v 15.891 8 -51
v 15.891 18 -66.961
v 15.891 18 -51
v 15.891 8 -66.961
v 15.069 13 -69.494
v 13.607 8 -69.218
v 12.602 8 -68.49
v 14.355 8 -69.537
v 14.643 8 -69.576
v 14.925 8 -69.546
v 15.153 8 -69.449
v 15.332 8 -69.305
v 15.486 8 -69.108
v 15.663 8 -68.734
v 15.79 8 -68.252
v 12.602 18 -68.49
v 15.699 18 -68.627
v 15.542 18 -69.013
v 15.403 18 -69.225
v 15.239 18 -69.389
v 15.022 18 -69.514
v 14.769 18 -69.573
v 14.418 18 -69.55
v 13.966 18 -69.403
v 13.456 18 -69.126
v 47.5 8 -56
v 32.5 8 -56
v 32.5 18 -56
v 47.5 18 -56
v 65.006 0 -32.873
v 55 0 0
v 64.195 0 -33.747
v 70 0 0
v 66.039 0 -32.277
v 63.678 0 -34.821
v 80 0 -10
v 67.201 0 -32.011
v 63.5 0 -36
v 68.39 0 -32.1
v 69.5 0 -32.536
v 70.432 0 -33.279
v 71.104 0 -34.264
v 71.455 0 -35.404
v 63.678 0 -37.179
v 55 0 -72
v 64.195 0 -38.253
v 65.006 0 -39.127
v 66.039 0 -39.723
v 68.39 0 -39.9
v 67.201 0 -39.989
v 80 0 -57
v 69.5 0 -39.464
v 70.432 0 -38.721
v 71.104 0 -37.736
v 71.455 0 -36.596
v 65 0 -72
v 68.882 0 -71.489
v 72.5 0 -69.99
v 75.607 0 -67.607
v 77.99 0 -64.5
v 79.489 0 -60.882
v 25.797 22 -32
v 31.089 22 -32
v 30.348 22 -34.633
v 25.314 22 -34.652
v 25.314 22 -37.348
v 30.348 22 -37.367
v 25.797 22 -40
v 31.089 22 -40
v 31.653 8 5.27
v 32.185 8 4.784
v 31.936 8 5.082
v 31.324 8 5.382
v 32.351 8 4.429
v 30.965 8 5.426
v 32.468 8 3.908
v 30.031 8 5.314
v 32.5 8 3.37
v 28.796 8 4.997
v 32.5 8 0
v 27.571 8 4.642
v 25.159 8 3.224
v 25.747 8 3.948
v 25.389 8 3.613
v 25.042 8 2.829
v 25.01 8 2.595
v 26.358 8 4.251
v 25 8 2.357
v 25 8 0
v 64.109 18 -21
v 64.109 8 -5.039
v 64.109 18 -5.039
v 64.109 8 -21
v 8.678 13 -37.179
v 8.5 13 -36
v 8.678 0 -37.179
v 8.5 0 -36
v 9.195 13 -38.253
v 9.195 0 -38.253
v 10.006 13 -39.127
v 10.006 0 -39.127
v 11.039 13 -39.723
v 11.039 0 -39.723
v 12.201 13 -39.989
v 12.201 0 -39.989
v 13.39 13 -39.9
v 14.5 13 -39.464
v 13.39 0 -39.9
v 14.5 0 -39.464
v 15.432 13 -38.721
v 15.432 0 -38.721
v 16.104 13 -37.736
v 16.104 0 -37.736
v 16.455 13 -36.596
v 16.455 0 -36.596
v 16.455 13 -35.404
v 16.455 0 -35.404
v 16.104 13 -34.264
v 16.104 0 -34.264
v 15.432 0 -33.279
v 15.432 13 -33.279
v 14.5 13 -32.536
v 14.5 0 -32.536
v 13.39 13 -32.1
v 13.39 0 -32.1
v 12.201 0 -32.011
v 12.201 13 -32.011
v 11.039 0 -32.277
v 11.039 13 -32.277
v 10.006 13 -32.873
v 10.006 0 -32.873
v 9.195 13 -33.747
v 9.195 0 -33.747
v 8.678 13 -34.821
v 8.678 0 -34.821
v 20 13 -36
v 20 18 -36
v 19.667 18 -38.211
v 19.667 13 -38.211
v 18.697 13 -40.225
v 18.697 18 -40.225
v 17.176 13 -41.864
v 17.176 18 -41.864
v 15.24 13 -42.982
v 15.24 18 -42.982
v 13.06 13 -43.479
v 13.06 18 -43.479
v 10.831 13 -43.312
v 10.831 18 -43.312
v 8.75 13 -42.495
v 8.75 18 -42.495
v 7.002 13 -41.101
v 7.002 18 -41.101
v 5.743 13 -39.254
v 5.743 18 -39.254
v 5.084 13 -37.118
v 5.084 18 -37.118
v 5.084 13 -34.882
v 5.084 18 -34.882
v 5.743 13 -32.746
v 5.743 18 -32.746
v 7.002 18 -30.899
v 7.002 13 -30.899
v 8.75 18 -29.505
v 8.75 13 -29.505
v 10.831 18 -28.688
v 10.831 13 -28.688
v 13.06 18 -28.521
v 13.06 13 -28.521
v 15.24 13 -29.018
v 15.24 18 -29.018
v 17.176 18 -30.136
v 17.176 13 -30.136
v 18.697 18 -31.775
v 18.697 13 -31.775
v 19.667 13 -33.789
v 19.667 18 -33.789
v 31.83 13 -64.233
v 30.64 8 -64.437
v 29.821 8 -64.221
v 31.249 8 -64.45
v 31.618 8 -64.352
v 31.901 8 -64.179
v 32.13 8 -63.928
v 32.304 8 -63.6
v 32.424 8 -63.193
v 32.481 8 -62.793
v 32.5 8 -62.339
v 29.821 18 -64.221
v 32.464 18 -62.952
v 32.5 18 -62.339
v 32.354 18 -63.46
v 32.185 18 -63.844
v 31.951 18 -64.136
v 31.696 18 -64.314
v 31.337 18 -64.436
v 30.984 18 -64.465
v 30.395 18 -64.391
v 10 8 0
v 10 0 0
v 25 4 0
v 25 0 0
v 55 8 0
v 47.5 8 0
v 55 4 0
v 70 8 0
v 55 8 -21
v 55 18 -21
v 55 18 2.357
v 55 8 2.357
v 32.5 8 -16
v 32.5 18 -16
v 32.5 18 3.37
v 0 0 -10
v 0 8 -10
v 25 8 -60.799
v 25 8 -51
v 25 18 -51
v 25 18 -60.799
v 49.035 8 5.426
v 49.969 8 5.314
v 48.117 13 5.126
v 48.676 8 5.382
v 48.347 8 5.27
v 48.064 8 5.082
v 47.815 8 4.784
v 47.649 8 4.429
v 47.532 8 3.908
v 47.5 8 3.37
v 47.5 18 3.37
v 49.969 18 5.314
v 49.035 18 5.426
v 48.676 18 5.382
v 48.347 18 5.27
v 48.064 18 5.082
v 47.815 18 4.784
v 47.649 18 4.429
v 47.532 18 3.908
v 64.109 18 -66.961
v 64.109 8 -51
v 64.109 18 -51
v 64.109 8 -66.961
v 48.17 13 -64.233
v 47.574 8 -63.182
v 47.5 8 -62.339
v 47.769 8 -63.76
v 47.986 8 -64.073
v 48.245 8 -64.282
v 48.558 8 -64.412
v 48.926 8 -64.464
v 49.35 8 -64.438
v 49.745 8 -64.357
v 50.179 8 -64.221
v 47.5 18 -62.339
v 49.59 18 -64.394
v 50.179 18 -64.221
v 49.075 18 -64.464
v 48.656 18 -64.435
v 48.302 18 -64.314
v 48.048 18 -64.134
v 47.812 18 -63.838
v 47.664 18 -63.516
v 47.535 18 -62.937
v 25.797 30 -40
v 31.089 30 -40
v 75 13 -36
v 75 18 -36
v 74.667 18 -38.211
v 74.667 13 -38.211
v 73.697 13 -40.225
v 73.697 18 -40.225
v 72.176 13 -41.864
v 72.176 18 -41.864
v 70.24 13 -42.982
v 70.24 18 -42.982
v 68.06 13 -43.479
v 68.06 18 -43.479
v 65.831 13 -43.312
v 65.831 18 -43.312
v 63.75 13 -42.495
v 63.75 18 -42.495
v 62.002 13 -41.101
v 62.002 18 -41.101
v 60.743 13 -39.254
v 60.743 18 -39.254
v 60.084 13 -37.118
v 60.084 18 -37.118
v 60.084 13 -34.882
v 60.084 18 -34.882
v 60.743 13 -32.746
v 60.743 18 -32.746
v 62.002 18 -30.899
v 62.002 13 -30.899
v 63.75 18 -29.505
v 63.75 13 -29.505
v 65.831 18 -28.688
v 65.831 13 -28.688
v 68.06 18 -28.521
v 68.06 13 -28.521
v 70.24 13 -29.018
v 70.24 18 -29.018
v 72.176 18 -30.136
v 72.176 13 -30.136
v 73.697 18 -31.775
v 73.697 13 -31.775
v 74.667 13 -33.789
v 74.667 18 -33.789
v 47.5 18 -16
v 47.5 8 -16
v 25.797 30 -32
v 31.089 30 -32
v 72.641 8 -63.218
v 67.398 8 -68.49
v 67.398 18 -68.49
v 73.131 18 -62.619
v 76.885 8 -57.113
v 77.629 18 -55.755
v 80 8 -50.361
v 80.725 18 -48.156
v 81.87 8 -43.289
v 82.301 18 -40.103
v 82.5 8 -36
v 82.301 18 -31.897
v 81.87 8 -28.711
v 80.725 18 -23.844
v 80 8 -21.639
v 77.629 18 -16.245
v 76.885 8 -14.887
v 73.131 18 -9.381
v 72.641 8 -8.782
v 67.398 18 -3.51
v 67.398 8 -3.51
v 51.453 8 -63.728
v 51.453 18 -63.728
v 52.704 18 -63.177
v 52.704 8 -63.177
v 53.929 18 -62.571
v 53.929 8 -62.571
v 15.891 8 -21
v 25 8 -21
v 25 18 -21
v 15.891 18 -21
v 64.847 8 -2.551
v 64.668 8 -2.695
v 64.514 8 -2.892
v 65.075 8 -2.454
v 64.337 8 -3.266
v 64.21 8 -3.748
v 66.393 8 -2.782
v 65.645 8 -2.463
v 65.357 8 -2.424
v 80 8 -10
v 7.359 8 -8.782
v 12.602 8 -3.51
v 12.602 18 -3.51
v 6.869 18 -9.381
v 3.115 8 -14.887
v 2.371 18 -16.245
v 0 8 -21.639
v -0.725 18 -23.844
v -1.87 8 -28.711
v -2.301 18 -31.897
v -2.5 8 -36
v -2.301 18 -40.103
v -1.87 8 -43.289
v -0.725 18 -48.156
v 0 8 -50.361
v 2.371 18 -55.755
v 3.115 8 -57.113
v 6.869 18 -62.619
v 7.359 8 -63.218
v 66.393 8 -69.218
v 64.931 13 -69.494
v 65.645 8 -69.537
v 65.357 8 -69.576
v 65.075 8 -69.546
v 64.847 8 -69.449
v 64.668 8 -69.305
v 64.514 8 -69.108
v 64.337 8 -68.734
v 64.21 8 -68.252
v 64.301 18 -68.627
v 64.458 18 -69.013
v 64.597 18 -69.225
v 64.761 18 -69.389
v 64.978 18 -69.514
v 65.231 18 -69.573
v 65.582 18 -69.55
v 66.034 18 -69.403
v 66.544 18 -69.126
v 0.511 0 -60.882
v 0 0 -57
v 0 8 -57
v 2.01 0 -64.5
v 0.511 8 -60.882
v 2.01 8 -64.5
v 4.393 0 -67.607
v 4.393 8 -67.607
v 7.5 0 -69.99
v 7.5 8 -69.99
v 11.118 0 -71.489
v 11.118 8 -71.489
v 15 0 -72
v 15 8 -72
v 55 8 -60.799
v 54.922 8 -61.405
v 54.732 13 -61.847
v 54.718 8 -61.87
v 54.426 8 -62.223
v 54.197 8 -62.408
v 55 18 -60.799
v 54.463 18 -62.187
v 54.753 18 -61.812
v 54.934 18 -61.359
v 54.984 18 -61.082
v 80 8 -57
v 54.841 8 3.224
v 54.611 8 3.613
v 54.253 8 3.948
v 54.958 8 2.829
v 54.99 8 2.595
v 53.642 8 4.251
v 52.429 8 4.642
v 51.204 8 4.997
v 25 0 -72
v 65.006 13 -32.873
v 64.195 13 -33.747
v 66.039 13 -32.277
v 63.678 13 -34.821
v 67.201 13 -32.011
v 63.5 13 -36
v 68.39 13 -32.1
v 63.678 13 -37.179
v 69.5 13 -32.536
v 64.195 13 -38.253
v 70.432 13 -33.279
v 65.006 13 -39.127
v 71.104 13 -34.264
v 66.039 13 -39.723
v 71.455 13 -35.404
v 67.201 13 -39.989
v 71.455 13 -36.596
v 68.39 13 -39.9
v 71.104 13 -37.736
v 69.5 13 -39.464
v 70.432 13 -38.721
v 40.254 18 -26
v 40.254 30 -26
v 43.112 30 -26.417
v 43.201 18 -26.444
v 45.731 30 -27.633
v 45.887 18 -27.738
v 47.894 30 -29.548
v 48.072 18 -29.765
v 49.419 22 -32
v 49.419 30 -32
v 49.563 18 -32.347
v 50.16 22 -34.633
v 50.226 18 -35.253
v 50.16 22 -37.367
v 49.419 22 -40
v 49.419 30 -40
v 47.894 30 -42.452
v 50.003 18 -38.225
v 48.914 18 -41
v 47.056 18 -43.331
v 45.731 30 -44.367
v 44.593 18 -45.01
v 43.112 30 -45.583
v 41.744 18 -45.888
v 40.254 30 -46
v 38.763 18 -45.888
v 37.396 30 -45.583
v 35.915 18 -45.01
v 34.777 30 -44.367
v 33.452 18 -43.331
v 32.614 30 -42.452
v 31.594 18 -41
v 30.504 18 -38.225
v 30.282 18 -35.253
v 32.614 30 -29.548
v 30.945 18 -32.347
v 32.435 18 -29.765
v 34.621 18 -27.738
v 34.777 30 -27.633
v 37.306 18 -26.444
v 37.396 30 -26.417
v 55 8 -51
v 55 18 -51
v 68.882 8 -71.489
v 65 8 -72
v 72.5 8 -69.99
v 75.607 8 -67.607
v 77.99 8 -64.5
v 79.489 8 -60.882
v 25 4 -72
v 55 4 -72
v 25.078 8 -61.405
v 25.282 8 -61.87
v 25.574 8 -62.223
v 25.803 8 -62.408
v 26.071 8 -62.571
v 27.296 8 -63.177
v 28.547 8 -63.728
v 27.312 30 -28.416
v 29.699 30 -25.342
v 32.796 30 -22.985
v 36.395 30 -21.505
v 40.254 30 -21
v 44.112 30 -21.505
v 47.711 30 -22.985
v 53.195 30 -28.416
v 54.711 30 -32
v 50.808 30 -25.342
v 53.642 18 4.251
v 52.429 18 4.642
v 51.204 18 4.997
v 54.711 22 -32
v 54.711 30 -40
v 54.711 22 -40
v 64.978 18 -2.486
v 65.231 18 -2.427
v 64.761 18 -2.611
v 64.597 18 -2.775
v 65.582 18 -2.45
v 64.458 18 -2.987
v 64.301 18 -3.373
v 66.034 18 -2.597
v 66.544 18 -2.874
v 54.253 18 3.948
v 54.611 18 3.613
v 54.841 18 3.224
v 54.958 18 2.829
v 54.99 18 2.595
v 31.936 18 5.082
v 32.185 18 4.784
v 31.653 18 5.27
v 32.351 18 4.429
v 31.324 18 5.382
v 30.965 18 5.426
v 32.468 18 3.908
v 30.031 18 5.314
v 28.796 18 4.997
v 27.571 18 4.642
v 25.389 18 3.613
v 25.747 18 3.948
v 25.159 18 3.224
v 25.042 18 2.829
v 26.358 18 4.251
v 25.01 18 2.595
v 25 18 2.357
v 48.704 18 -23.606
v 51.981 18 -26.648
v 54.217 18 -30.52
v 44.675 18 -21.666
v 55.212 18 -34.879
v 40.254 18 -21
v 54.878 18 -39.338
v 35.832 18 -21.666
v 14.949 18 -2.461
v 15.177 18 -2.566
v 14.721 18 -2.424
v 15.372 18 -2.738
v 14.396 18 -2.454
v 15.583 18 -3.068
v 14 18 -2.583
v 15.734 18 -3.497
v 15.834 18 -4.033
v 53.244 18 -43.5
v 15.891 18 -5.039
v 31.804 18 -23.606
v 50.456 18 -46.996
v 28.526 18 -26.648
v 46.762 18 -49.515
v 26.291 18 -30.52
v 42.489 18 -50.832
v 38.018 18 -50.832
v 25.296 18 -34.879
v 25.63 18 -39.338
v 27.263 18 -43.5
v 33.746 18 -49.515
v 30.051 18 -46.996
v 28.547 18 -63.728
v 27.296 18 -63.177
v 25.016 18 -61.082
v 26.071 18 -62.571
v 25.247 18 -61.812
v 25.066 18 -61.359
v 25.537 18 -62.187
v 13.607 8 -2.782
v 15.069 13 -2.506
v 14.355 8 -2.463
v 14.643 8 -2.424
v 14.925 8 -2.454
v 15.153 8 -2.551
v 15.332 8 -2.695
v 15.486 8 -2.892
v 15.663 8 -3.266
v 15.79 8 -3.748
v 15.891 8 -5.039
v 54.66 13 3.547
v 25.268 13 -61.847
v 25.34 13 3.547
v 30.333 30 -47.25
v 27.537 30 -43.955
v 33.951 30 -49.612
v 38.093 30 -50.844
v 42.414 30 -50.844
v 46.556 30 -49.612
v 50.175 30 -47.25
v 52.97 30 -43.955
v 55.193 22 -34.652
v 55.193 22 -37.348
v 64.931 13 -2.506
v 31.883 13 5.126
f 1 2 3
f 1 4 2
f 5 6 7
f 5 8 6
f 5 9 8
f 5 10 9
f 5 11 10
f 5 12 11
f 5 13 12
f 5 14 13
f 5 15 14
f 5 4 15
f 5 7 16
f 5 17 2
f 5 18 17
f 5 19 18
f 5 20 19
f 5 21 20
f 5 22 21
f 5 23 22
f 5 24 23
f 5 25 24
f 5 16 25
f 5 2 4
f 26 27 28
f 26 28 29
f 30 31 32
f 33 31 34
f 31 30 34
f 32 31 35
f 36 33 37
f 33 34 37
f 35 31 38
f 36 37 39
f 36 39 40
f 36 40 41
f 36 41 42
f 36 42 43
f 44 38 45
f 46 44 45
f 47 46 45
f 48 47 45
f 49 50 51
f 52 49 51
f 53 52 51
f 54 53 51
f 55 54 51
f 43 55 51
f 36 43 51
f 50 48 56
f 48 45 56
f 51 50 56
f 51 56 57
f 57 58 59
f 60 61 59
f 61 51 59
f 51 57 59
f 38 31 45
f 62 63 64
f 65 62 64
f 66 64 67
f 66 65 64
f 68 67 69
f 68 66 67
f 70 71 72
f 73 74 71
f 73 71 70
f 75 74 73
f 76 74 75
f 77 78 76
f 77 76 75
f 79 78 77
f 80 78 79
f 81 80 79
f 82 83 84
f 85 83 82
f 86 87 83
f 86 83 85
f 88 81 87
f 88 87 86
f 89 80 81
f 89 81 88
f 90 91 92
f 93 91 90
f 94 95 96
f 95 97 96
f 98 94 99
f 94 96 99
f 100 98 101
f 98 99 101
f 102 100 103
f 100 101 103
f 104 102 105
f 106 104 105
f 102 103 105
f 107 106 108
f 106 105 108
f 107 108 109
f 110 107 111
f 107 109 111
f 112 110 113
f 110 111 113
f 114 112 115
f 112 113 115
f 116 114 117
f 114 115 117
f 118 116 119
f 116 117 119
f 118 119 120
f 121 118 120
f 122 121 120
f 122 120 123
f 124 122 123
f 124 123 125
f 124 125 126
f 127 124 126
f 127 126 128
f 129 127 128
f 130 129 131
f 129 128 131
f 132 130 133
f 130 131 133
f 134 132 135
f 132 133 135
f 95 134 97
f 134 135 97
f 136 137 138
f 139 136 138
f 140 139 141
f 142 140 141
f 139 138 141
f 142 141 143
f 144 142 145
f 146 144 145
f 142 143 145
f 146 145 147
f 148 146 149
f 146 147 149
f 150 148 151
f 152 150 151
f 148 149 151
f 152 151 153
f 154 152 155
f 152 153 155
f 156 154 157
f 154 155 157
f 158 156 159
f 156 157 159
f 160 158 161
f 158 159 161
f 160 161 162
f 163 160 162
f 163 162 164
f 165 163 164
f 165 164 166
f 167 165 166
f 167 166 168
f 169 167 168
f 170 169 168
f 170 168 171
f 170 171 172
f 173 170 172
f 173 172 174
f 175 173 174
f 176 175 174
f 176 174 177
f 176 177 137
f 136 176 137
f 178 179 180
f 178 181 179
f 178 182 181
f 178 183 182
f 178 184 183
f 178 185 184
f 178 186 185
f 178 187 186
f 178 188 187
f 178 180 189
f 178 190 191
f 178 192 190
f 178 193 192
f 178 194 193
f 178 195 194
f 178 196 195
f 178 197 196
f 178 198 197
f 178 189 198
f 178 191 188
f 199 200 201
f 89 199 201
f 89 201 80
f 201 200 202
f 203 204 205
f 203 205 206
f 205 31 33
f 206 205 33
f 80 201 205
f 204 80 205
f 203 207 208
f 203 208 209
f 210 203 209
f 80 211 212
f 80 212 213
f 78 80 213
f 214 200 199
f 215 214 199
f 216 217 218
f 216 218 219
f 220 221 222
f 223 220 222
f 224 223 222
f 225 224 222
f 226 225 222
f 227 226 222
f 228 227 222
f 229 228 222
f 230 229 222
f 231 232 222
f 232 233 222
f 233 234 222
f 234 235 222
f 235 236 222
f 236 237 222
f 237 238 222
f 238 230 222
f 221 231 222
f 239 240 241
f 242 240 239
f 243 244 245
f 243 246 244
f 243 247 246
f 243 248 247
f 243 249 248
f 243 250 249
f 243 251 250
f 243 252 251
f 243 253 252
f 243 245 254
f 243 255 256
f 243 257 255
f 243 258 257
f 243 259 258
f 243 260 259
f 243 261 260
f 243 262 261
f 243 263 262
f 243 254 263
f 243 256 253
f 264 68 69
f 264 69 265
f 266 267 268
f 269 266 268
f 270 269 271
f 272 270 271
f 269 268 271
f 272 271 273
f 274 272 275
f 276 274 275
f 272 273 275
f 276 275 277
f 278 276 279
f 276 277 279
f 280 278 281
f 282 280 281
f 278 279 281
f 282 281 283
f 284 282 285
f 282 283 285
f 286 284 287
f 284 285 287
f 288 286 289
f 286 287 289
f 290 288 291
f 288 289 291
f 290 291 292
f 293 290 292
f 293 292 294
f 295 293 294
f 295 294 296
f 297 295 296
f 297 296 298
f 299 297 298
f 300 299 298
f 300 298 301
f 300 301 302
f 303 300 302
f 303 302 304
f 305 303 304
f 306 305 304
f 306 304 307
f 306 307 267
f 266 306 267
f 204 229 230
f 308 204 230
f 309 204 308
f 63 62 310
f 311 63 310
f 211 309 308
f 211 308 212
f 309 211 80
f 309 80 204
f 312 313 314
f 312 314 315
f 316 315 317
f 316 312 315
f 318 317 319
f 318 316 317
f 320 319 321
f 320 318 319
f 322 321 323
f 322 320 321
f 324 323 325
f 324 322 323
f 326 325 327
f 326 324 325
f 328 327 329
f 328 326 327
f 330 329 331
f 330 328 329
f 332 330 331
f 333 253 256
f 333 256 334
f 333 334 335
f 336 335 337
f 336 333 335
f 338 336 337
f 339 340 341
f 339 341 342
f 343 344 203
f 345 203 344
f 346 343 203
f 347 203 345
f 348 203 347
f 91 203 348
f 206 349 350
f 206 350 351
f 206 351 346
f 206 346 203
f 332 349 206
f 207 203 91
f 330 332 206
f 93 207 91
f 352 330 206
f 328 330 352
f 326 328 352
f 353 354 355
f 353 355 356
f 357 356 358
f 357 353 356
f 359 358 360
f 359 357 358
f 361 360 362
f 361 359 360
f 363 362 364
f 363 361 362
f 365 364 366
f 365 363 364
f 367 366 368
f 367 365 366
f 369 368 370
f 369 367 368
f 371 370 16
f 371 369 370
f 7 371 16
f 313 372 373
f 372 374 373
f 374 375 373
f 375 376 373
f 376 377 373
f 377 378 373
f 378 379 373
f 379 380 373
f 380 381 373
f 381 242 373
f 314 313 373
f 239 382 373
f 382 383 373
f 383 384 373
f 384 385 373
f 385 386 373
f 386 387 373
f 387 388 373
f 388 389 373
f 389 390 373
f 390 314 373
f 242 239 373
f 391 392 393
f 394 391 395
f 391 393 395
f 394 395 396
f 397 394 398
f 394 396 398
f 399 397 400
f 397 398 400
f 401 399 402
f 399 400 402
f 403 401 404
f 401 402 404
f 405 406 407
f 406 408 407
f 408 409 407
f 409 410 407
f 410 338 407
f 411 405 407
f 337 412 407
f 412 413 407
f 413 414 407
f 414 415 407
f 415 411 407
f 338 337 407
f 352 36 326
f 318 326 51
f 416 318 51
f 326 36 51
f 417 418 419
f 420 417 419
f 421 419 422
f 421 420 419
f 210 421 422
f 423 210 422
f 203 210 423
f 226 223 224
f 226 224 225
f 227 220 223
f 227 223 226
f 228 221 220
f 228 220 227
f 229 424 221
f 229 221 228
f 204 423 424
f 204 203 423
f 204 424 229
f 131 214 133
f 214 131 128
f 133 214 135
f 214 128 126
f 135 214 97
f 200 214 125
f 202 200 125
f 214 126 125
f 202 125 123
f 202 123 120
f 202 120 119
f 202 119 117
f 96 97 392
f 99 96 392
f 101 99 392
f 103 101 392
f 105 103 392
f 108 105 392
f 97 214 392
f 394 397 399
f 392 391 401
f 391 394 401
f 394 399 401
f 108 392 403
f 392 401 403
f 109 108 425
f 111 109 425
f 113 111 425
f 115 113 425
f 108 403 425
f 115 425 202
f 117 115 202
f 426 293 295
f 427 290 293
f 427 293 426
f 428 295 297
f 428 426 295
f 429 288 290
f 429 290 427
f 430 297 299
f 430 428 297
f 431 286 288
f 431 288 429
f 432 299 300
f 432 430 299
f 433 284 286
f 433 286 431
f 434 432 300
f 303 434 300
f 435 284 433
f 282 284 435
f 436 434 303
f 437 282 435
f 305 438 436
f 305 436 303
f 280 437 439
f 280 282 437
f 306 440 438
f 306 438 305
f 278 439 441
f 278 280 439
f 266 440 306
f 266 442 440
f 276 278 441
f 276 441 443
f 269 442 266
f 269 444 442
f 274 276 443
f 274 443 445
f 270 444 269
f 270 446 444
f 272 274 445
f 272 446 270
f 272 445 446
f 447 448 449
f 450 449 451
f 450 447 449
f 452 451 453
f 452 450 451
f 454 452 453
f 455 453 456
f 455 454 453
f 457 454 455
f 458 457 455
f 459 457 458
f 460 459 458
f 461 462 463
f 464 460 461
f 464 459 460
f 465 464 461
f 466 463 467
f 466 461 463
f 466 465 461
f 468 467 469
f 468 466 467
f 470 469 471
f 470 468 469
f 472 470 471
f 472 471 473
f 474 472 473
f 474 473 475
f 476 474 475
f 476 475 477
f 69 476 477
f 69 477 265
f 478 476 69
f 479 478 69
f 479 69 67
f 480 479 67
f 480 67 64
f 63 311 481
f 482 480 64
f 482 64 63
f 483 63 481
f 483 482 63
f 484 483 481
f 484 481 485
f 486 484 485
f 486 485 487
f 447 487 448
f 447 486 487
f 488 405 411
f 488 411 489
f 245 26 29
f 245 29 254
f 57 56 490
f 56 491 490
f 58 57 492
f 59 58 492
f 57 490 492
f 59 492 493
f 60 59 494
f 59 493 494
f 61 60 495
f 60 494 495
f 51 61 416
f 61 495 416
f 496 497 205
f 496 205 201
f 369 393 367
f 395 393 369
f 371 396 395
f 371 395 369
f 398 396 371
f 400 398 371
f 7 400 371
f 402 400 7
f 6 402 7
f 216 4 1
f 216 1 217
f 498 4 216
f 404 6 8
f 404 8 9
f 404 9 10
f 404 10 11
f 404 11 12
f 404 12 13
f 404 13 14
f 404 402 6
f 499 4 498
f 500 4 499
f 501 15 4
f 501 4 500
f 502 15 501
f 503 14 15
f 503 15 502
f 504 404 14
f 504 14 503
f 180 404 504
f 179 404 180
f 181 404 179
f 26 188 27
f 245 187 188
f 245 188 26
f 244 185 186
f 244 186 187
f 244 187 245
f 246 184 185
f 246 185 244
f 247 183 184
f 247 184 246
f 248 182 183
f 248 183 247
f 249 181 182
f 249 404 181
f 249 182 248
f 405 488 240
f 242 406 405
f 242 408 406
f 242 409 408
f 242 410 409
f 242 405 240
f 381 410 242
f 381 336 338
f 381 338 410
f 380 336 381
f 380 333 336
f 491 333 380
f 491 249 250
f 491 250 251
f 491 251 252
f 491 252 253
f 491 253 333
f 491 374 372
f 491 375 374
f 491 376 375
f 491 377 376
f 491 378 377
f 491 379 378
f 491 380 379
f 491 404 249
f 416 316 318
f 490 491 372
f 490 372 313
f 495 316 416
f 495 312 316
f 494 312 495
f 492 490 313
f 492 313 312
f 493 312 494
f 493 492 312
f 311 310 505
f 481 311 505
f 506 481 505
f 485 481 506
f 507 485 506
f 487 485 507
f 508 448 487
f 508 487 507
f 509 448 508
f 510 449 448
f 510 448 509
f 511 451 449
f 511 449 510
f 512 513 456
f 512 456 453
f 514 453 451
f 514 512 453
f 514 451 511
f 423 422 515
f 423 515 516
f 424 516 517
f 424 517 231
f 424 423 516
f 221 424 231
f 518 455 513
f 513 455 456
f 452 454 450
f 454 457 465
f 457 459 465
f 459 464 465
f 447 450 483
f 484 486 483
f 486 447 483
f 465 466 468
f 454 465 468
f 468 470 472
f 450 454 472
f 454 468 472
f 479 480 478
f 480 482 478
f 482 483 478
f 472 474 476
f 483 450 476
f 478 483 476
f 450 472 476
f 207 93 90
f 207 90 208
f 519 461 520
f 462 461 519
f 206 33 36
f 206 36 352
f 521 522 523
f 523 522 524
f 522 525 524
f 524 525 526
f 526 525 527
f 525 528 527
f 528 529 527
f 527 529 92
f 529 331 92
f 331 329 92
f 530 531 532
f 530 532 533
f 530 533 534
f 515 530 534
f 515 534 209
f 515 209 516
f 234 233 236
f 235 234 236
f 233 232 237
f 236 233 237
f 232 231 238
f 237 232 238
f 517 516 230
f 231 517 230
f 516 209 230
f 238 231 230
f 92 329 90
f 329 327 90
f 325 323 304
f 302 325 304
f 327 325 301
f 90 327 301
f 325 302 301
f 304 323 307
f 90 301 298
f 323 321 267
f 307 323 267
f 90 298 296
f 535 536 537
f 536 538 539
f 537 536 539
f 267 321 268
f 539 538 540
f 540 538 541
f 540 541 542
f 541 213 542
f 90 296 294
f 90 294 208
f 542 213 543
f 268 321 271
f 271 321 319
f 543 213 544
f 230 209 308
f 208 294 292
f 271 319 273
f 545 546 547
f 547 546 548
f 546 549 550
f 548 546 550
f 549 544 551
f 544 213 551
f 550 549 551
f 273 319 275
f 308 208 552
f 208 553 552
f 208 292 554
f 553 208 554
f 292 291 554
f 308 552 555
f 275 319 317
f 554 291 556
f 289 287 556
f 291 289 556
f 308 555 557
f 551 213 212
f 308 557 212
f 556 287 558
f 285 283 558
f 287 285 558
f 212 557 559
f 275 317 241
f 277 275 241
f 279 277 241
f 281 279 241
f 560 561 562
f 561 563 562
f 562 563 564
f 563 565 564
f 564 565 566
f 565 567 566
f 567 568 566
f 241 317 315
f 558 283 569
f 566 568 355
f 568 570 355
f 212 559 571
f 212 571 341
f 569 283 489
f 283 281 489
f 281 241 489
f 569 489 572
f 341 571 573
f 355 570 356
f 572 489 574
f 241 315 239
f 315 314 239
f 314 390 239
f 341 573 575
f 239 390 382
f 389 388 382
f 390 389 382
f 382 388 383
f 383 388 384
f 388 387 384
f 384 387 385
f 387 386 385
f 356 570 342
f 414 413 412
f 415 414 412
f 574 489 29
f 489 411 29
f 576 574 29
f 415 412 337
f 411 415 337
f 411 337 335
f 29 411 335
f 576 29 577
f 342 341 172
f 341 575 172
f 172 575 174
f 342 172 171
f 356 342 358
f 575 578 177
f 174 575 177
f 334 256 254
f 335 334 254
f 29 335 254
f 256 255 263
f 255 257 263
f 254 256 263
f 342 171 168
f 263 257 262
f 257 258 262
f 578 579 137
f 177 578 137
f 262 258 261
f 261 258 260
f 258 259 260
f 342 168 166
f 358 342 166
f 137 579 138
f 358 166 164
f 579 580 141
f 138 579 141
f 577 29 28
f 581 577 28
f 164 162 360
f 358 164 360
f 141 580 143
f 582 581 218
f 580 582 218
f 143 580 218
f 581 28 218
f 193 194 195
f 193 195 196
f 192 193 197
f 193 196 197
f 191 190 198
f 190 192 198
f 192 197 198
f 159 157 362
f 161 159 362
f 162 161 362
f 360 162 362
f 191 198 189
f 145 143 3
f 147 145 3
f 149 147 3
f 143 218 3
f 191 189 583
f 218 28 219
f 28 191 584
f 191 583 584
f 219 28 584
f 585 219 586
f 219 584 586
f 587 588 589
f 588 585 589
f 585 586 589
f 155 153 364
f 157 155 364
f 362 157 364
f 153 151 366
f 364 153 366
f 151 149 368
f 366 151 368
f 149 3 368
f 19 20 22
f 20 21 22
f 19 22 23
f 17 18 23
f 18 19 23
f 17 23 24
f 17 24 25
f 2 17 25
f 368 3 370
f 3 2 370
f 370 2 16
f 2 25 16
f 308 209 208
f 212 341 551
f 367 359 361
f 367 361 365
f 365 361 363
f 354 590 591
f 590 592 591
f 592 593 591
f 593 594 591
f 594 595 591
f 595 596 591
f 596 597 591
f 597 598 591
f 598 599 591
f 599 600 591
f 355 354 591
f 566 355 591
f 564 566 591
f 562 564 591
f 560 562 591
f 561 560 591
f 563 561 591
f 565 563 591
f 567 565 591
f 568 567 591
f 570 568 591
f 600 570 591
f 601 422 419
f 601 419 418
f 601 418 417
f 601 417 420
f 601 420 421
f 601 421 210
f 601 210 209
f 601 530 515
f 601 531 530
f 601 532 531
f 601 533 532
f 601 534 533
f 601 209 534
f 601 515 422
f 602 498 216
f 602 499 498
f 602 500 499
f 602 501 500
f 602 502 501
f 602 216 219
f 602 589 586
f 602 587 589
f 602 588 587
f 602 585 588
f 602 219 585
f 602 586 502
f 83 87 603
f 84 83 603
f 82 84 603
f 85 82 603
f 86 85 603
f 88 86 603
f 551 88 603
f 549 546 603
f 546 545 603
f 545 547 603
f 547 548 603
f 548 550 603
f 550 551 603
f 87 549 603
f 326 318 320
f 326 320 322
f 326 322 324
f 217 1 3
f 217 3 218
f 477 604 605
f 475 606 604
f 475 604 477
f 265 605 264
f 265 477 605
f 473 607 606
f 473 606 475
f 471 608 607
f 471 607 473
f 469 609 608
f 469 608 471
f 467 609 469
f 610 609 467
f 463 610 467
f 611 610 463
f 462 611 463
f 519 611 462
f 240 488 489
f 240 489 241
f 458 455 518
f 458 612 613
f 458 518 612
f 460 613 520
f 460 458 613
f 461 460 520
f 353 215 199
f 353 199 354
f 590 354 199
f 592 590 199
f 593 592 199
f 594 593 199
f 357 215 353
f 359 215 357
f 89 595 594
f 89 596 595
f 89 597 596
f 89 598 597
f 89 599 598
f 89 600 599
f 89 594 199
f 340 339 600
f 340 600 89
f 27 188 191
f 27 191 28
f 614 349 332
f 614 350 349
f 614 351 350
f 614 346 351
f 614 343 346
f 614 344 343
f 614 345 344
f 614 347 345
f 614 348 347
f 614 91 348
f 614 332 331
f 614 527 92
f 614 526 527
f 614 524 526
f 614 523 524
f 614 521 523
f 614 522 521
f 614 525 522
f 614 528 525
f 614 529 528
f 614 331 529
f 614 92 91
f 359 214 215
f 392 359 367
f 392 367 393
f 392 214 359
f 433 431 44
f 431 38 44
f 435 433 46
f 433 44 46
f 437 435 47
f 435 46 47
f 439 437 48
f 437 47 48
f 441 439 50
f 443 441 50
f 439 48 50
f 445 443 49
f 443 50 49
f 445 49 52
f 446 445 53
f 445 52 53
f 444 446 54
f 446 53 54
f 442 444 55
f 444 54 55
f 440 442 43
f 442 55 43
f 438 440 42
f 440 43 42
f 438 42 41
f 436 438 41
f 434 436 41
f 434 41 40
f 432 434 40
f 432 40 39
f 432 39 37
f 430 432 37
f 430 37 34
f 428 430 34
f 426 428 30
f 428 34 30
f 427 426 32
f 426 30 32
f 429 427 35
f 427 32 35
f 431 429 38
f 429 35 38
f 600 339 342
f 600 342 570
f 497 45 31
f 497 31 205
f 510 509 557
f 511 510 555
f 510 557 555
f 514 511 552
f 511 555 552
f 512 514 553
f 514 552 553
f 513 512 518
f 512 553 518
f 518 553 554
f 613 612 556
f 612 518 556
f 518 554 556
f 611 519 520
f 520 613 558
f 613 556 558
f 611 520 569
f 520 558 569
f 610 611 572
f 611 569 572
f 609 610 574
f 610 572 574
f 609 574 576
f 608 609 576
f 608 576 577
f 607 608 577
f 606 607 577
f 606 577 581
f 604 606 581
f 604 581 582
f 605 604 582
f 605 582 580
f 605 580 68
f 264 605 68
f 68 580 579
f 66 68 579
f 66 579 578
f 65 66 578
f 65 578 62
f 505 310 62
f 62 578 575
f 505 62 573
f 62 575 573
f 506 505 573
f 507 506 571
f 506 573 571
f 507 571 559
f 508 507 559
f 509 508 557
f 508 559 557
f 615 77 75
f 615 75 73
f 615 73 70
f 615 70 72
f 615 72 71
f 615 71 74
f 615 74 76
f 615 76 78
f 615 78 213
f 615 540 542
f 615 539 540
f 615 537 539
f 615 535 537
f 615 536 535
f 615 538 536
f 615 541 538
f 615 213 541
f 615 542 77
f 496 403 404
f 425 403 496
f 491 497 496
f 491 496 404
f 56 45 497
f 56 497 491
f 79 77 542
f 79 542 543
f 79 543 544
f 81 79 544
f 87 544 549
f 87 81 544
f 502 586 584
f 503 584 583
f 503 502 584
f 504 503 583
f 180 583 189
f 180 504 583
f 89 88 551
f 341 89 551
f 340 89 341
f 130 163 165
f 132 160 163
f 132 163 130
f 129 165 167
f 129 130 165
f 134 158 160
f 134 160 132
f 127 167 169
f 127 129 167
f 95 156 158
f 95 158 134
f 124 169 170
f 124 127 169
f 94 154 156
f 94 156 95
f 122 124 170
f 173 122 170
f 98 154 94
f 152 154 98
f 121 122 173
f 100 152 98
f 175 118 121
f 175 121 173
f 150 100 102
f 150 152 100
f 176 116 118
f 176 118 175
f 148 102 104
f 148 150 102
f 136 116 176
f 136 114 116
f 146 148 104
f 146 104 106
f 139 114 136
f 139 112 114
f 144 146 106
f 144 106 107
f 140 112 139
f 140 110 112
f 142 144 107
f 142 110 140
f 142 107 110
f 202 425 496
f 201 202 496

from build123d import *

# Parameters (mm, degrees)
SKETCH2_W                                = 80
SKETCH2_H                                = 72
BOSS_EXTRUDE1_DEPTH                      = 8
BOSS_EXTRUDE2_DEPTH                      = 10
CHAMFER1_SIZE                            = 10
FILLET1_R                                = 15
SKETCH4_R                                = 15
SKETCH4_R_2                              = 10
BOSS_EXTRUDE3_DEPTH                      = 12
SKETCH5_W                                = 8
SKETCH5_H                                = 8
CUT_EXTRUDE1_DEPTH                       = 114.535236821
CBORE_FOR_M10_HEX_HEAD_BOLT1_D           = 8
CBORE_FOR_M10_HEX_HEAD_BOLT1_CBORE_D     = 15
CBORE_FOR_M10_HEX_HEAD_BOLT1_CBORE_DEPTH = 5
SKETCH8_W                                = 30
SKETCH8_H                                = 4
CUT_EXTRUDE2_DEPTH                       = 118.321038589


with BuildPart() as part:
    # Sketch2 → Boss-Extrude1 (new body)
    with BuildSketch(Plane(origin=(0, 0, 0), x_dir=(1, 0, 0), z_dir=(0, 1, 0))):
        with Locations((40, 36)):
            Rectangle(SKETCH2_W, SKETCH2_H)
    extrude(amount=BOSS_EXTRUDE1_DEPTH)

    # Sketch3 → Boss-Extrude2 (add)
    with BuildSketch(Plane(origin=(0, 8, 0), x_dir=(1, 0, 0), z_dir=(0, 1, 0))):
        with BuildLine():
            Line((32.5, 65.047375097), (32.5, 56))
            Line((32.5, 56), (47.5, 56))
            Line((47.5, 56), (47.5, 65.047375097))
            ThreePointArc((47.5, 65.047375097), (51.354009371, 63.768443802), (55, 61.980762114))
            Line((55, 61.980762114), (55, 51))
            Line((55, 51), (64.109126902, 51))
            Line((64.109126902, 51), (64.109126902, 71))
            ThreePointArc((64.109126902, 71), (82.5, 36), (64.109126902, 1))
            Line((64.109126902, 1), (64.109126902, 21))
            Line((64.109126902, 21), (55, 21))
            Line((55, 21), (55, -3.764934301))
            ThreePointArc((55, -3.764934301), (51.297421179, -4.970944274), (47.5, -5.833001327))
            Line((47.5, -5.833001327), (47.5, 16))
            Line((47.5, 16), (32.5, 16))
            Line((32.5, 16), (32.5, -5.833001327))
            ThreePointArc((32.5, -5.833001327), (28.702578821, -4.970944274), (25, -3.764934301))
            Line((25, -3.764934301), (25, 21))
            Line((25, 21), (15.890873098, 21))
            Line((15.890873098, 21), (15.890873098, 1))
            ThreePointArc((15.890873098, 1), (-2.5, 36), (15.890873098, 71))
            Line((15.890873098, 71), (15.890873098, 51))
            Line((15.890873098, 51), (25, 51))
            Line((25, 51), (25, 61.980762114))
            ThreePointArc((25, 61.980762114), (28.645990629, 63.768443802), (32.5, 65.047375097))
        make_face()
    extrude(amount=BOSS_EXTRUDE2_DEPTH)

    # Chamfer1
    chamfer1_edges = [part.edges().sort_by_distance(p)[0] for p in [
        (80, 4, 0),
        (0, 4, 0),
    ]]
    chamfer(chamfer1_edges, length=CHAMFER1_SIZE)

    # Fillet1
    fillet1_edges = [part.edges().sort_by_distance(p)[0] for p in [
        (0, 4, -72),
        (80, 4, -72),
    ]]
    fillet(fillet1_edges, radius=FILLET1_R)

    # Sketch4 → Boss-Extrude3 (add)
    with BuildSketch(Plane(origin=(0, 18, 0), x_dir=(1, 0, 0), z_dir=(0, 1, 0))):
        with Locations(Location((40.253775516, 36, 0), (0, 0, 270))):
            Circle(SKETCH4_R)
        with Locations(Location((40.253775516, 36, 0), (0, 0, 270))):
            Circle(SKETCH4_R_2, mode=Mode.SUBTRACT)
    extrude(amount=BOSS_EXTRUDE3_DEPTH)

    # Sketch5 → Cut-Extrude1 (cut, through all)
    with BuildSketch(Plane(origin=(0, 0, 0), x_dir=(0, 0, -1), z_dir=(1, 0, 0))):
        with Locations((36, 26)):
            Rectangle(SKETCH5_W, SKETCH5_H)
    extrude(amount=CUT_EXTRUDE1_DEPTH, mode=Mode.SUBTRACT)

    # CBORE for M10 Hex Head Bolt1 (through all)
    with Locations(Plane(origin=(0, 18, 0), x_dir=(1, 0, 0), z_dir=(0, 1, 0))):
        with Locations((67.5, 36), (12.5, 36)):
            CounterBoreHole(CBORE_FOR_M10_HEX_HEAD_BOLT1_D / 2, CBORE_FOR_M10_HEX_HEAD_BOLT1_CBORE_D / 2, CBORE_FOR_M10_HEX_HEAD_BOLT1_CBORE_DEPTH)

    # Sketch8 → Cut-Extrude2 (cut, through all)
    with BuildSketch(Plane(origin=(0, 0, -72), x_dir=(-1, 0, 0), z_dir=(0, 0, -1))):
        with Locations((-40, 2)):
            Rectangle(SKETCH8_W, SKETCH8_H)
    extrude(amount=-CUT_EXTRUDE2_DEPTH, mode=Mode.SUBTRACT)

    # Fillet2
    # a fillet whose section is not a circle: 2 mm, written as the material it takes off along each edge
    with BuildSketch(Plane(origin=(64.109126902, 8, -71), x_dir=(0.7949377645481589, 0, 0.6066909843529702), z_dir=(0, 1, 0)), Plane(origin=(15.890873098, 8, -1), x_dir=(-0.7949377645481593, 0, -0.6066909843529693), z_dir=(0, 1, 0))) as fillet2_piece_1:
        with BuildLine():
            Bezier((4.137858015, 0), (-0.159861677, 0.20946427), (2.45062112, -3.211010754), weights=[1, 1, 1])
            Line((2.45062112, -3.211010754), (0, 0))
            ThreePointArc((0, 0), (2.068929007, 0.050388308), (4.137858015, 0))
        make_face()
    extrude(amount=20.344645036, mode=Mode.SUBTRACT)
    with BuildSketch(Plane(origin=(15.890873098, 8, -71), x_dir=(-0.794937764548161, 0, 0.6066909843529674), z_dir=(0, 1, 0)), Plane(origin=(64.109126902, 8, -1), x_dir=(0.7949377645481593, 0, -0.6066909843529698), z_dir=(0, 1, 0))) as fillet2_piece_2:
        with BuildLine():
            Bezier((4.137858015, 0), (-0.159861677, -0.20946427), (2.45062112, 3.211010754), weights=[1, 1, 1])
            Line((2.45062112, 3.211010754), (0, 0))
            ThreePointArc((0, 0), (2.068929007, -0.050388308), (4.137858015, 0))
        make_face()
    extrude(amount=20.344645036, mode=Mode.SUBTRACT)
    with BuildSketch(Plane(origin=(55, 4.393986535, 3.764934301), x_dir=(0, 0, -1), z_dir=(0, 1, 0))) as fillet2_piece_3:
        with BuildLine():
            Bezier((1.408057473, 0), (-0.025844464, 0), (-0.486109283, 1.358024691), weights=[1, 1, 1])
            ThreePointArc((-0.486109283, 1.358024691), (-0.248816298, 0.676949942), (0, 0))
            Line((0, 0), (1.408057473, 0))
        make_face()
    extrude(amount=17.21202693, mode=Mode.SUBTRACT)
    with BuildSketch(Plane(origin=(47.5, 1.692392429, 5.833001327), x_dir=(0, 0, -1), z_dir=(0, 1, 0))) as fillet2_piece_4:
        with BuildLine():
            Bezier((2.462961957, 0), (-0.077040583, 0), (0.518762482, -2.469135802), weights=[1, 1, 1])
            ThreePointArc((0.518762482, -2.469135802), (0.241054451, -1.238418338), (0, 0))
            Line((0, 0), (2.462961957, 0))
        make_face()
    extrude(amount=22.615215142, mode=Mode.SUBTRACT)
    with BuildSketch(Plane(origin=(32.5, 1.692392429, 5.833001327), x_dir=(0, 0, -1), z_dir=(0, 1, 0))) as fillet2_piece_5:
        with BuildLine():
            Bezier((2.462961957, 0), (-0.077040583, 0), (0.518762482, 2.469135802), weights=[1, 1, 1])
            ThreePointArc((0.518762482, 2.469135802), (0.241054451, 1.238418338), (0, 0))
            Line((0, 0), (2.462961957, 0))
        make_face()
    extrude(amount=22.615215142, mode=Mode.SUBTRACT)
    with BuildSketch(Plane(origin=(25, 4.393986535, 3.764934301), x_dir=(0, 0, -1), z_dir=(0, 1, 0))) as fillet2_piece_6:
        with BuildLine():
            Bezier((1.408057473, 0), (-0.025844464, 0), (-0.486109283, -1.358024691), weights=[1, 1, 1])
            ThreePointArc((-0.486109283, -1.358024691), (-0.248816298, -0.676949942), (0, 0))
            Line((0, 0), (1.408057473, 0))
        make_face()
    extrude(amount=17.21202693, mode=Mode.SUBTRACT)
    with BuildSketch(Plane(origin=(55, 8, -61.980762114), x_dir=(0, 0, 1), z_dir=(0, 1, 0))) as fillet2_piece_7:
        with BuildLine():
            Bezier((1.181568578, 0), (-0.02814818, 0), (-0.589802389, -1.071428571), weights=[1, 1, 1])
            ThreePointArc((-0.589802389, -1.071428571), (-0.30036176, -0.532708341), (0, 0))
            Line((0, 0), (1.181568578, 0))
        make_face()
    extrude(amount=13.057599182, mode=Mode.SUBTRACT)
    with BuildSketch(Plane(origin=(47.5, 8, -65.047375097), x_dir=(0, 0, 1), z_dir=(0, 1, 0))) as fillet2_piece_8:
        with BuildLine():
            Bezier((2.708240714, 0), (-0.139233273, 0), (0.826873973, 2.678571429), weights=[1, 1, 1])
            ThreePointArc((0.826873973, 2.678571429), (0.382133114, 1.348949208), (0, 0))
            Line((0, 0), (2.708240714, 0))
        make_face()
    extrude(amount=17.008238663, mode=Mode.SUBTRACT)
    with BuildSketch(Plane(origin=(32.5, 8, -65.047375097), x_dir=(-0.9555080660857783, 0, 0.294964973590113), z_dir=(0, 1, 0))) as fillet2_piece_9:
        with BuildLine():
            Bezier((2.803295465, 0), (-0.041068939, -0.133038515), (0.798836151, 2.587745848), weights=[1, 1, 1])
            Line((0.798836151, 2.587745848), (0, 0))
            ThreePointArc((0, 0), (1.401647733, -0.032761495), (2.803295465, 0))
        make_face()
    extrude(amount=17.008238663, mode=Mode.SUBTRACT)
    with BuildSketch(Plane(origin=(25, 8, -61.980762114), x_dir=(0, 0, 1), z_dir=(0, 1, 0))) as fillet2_piece_10:
        with BuildLine():
            Bezier((1.181568578, 0), (-0.02814818, 0), (-0.589802389, 1.071428571), weights=[1, 1, 1])
            ThreePointArc((-0.589802389, 1.071428571), (-0.30036176, 0.532708341), (0, 0))
            Line((0, 0), (1.181568578, 0))
        make_face()
    extrude(amount=13.057599182, mode=Mode.SUBTRACT)


solid = part.part
